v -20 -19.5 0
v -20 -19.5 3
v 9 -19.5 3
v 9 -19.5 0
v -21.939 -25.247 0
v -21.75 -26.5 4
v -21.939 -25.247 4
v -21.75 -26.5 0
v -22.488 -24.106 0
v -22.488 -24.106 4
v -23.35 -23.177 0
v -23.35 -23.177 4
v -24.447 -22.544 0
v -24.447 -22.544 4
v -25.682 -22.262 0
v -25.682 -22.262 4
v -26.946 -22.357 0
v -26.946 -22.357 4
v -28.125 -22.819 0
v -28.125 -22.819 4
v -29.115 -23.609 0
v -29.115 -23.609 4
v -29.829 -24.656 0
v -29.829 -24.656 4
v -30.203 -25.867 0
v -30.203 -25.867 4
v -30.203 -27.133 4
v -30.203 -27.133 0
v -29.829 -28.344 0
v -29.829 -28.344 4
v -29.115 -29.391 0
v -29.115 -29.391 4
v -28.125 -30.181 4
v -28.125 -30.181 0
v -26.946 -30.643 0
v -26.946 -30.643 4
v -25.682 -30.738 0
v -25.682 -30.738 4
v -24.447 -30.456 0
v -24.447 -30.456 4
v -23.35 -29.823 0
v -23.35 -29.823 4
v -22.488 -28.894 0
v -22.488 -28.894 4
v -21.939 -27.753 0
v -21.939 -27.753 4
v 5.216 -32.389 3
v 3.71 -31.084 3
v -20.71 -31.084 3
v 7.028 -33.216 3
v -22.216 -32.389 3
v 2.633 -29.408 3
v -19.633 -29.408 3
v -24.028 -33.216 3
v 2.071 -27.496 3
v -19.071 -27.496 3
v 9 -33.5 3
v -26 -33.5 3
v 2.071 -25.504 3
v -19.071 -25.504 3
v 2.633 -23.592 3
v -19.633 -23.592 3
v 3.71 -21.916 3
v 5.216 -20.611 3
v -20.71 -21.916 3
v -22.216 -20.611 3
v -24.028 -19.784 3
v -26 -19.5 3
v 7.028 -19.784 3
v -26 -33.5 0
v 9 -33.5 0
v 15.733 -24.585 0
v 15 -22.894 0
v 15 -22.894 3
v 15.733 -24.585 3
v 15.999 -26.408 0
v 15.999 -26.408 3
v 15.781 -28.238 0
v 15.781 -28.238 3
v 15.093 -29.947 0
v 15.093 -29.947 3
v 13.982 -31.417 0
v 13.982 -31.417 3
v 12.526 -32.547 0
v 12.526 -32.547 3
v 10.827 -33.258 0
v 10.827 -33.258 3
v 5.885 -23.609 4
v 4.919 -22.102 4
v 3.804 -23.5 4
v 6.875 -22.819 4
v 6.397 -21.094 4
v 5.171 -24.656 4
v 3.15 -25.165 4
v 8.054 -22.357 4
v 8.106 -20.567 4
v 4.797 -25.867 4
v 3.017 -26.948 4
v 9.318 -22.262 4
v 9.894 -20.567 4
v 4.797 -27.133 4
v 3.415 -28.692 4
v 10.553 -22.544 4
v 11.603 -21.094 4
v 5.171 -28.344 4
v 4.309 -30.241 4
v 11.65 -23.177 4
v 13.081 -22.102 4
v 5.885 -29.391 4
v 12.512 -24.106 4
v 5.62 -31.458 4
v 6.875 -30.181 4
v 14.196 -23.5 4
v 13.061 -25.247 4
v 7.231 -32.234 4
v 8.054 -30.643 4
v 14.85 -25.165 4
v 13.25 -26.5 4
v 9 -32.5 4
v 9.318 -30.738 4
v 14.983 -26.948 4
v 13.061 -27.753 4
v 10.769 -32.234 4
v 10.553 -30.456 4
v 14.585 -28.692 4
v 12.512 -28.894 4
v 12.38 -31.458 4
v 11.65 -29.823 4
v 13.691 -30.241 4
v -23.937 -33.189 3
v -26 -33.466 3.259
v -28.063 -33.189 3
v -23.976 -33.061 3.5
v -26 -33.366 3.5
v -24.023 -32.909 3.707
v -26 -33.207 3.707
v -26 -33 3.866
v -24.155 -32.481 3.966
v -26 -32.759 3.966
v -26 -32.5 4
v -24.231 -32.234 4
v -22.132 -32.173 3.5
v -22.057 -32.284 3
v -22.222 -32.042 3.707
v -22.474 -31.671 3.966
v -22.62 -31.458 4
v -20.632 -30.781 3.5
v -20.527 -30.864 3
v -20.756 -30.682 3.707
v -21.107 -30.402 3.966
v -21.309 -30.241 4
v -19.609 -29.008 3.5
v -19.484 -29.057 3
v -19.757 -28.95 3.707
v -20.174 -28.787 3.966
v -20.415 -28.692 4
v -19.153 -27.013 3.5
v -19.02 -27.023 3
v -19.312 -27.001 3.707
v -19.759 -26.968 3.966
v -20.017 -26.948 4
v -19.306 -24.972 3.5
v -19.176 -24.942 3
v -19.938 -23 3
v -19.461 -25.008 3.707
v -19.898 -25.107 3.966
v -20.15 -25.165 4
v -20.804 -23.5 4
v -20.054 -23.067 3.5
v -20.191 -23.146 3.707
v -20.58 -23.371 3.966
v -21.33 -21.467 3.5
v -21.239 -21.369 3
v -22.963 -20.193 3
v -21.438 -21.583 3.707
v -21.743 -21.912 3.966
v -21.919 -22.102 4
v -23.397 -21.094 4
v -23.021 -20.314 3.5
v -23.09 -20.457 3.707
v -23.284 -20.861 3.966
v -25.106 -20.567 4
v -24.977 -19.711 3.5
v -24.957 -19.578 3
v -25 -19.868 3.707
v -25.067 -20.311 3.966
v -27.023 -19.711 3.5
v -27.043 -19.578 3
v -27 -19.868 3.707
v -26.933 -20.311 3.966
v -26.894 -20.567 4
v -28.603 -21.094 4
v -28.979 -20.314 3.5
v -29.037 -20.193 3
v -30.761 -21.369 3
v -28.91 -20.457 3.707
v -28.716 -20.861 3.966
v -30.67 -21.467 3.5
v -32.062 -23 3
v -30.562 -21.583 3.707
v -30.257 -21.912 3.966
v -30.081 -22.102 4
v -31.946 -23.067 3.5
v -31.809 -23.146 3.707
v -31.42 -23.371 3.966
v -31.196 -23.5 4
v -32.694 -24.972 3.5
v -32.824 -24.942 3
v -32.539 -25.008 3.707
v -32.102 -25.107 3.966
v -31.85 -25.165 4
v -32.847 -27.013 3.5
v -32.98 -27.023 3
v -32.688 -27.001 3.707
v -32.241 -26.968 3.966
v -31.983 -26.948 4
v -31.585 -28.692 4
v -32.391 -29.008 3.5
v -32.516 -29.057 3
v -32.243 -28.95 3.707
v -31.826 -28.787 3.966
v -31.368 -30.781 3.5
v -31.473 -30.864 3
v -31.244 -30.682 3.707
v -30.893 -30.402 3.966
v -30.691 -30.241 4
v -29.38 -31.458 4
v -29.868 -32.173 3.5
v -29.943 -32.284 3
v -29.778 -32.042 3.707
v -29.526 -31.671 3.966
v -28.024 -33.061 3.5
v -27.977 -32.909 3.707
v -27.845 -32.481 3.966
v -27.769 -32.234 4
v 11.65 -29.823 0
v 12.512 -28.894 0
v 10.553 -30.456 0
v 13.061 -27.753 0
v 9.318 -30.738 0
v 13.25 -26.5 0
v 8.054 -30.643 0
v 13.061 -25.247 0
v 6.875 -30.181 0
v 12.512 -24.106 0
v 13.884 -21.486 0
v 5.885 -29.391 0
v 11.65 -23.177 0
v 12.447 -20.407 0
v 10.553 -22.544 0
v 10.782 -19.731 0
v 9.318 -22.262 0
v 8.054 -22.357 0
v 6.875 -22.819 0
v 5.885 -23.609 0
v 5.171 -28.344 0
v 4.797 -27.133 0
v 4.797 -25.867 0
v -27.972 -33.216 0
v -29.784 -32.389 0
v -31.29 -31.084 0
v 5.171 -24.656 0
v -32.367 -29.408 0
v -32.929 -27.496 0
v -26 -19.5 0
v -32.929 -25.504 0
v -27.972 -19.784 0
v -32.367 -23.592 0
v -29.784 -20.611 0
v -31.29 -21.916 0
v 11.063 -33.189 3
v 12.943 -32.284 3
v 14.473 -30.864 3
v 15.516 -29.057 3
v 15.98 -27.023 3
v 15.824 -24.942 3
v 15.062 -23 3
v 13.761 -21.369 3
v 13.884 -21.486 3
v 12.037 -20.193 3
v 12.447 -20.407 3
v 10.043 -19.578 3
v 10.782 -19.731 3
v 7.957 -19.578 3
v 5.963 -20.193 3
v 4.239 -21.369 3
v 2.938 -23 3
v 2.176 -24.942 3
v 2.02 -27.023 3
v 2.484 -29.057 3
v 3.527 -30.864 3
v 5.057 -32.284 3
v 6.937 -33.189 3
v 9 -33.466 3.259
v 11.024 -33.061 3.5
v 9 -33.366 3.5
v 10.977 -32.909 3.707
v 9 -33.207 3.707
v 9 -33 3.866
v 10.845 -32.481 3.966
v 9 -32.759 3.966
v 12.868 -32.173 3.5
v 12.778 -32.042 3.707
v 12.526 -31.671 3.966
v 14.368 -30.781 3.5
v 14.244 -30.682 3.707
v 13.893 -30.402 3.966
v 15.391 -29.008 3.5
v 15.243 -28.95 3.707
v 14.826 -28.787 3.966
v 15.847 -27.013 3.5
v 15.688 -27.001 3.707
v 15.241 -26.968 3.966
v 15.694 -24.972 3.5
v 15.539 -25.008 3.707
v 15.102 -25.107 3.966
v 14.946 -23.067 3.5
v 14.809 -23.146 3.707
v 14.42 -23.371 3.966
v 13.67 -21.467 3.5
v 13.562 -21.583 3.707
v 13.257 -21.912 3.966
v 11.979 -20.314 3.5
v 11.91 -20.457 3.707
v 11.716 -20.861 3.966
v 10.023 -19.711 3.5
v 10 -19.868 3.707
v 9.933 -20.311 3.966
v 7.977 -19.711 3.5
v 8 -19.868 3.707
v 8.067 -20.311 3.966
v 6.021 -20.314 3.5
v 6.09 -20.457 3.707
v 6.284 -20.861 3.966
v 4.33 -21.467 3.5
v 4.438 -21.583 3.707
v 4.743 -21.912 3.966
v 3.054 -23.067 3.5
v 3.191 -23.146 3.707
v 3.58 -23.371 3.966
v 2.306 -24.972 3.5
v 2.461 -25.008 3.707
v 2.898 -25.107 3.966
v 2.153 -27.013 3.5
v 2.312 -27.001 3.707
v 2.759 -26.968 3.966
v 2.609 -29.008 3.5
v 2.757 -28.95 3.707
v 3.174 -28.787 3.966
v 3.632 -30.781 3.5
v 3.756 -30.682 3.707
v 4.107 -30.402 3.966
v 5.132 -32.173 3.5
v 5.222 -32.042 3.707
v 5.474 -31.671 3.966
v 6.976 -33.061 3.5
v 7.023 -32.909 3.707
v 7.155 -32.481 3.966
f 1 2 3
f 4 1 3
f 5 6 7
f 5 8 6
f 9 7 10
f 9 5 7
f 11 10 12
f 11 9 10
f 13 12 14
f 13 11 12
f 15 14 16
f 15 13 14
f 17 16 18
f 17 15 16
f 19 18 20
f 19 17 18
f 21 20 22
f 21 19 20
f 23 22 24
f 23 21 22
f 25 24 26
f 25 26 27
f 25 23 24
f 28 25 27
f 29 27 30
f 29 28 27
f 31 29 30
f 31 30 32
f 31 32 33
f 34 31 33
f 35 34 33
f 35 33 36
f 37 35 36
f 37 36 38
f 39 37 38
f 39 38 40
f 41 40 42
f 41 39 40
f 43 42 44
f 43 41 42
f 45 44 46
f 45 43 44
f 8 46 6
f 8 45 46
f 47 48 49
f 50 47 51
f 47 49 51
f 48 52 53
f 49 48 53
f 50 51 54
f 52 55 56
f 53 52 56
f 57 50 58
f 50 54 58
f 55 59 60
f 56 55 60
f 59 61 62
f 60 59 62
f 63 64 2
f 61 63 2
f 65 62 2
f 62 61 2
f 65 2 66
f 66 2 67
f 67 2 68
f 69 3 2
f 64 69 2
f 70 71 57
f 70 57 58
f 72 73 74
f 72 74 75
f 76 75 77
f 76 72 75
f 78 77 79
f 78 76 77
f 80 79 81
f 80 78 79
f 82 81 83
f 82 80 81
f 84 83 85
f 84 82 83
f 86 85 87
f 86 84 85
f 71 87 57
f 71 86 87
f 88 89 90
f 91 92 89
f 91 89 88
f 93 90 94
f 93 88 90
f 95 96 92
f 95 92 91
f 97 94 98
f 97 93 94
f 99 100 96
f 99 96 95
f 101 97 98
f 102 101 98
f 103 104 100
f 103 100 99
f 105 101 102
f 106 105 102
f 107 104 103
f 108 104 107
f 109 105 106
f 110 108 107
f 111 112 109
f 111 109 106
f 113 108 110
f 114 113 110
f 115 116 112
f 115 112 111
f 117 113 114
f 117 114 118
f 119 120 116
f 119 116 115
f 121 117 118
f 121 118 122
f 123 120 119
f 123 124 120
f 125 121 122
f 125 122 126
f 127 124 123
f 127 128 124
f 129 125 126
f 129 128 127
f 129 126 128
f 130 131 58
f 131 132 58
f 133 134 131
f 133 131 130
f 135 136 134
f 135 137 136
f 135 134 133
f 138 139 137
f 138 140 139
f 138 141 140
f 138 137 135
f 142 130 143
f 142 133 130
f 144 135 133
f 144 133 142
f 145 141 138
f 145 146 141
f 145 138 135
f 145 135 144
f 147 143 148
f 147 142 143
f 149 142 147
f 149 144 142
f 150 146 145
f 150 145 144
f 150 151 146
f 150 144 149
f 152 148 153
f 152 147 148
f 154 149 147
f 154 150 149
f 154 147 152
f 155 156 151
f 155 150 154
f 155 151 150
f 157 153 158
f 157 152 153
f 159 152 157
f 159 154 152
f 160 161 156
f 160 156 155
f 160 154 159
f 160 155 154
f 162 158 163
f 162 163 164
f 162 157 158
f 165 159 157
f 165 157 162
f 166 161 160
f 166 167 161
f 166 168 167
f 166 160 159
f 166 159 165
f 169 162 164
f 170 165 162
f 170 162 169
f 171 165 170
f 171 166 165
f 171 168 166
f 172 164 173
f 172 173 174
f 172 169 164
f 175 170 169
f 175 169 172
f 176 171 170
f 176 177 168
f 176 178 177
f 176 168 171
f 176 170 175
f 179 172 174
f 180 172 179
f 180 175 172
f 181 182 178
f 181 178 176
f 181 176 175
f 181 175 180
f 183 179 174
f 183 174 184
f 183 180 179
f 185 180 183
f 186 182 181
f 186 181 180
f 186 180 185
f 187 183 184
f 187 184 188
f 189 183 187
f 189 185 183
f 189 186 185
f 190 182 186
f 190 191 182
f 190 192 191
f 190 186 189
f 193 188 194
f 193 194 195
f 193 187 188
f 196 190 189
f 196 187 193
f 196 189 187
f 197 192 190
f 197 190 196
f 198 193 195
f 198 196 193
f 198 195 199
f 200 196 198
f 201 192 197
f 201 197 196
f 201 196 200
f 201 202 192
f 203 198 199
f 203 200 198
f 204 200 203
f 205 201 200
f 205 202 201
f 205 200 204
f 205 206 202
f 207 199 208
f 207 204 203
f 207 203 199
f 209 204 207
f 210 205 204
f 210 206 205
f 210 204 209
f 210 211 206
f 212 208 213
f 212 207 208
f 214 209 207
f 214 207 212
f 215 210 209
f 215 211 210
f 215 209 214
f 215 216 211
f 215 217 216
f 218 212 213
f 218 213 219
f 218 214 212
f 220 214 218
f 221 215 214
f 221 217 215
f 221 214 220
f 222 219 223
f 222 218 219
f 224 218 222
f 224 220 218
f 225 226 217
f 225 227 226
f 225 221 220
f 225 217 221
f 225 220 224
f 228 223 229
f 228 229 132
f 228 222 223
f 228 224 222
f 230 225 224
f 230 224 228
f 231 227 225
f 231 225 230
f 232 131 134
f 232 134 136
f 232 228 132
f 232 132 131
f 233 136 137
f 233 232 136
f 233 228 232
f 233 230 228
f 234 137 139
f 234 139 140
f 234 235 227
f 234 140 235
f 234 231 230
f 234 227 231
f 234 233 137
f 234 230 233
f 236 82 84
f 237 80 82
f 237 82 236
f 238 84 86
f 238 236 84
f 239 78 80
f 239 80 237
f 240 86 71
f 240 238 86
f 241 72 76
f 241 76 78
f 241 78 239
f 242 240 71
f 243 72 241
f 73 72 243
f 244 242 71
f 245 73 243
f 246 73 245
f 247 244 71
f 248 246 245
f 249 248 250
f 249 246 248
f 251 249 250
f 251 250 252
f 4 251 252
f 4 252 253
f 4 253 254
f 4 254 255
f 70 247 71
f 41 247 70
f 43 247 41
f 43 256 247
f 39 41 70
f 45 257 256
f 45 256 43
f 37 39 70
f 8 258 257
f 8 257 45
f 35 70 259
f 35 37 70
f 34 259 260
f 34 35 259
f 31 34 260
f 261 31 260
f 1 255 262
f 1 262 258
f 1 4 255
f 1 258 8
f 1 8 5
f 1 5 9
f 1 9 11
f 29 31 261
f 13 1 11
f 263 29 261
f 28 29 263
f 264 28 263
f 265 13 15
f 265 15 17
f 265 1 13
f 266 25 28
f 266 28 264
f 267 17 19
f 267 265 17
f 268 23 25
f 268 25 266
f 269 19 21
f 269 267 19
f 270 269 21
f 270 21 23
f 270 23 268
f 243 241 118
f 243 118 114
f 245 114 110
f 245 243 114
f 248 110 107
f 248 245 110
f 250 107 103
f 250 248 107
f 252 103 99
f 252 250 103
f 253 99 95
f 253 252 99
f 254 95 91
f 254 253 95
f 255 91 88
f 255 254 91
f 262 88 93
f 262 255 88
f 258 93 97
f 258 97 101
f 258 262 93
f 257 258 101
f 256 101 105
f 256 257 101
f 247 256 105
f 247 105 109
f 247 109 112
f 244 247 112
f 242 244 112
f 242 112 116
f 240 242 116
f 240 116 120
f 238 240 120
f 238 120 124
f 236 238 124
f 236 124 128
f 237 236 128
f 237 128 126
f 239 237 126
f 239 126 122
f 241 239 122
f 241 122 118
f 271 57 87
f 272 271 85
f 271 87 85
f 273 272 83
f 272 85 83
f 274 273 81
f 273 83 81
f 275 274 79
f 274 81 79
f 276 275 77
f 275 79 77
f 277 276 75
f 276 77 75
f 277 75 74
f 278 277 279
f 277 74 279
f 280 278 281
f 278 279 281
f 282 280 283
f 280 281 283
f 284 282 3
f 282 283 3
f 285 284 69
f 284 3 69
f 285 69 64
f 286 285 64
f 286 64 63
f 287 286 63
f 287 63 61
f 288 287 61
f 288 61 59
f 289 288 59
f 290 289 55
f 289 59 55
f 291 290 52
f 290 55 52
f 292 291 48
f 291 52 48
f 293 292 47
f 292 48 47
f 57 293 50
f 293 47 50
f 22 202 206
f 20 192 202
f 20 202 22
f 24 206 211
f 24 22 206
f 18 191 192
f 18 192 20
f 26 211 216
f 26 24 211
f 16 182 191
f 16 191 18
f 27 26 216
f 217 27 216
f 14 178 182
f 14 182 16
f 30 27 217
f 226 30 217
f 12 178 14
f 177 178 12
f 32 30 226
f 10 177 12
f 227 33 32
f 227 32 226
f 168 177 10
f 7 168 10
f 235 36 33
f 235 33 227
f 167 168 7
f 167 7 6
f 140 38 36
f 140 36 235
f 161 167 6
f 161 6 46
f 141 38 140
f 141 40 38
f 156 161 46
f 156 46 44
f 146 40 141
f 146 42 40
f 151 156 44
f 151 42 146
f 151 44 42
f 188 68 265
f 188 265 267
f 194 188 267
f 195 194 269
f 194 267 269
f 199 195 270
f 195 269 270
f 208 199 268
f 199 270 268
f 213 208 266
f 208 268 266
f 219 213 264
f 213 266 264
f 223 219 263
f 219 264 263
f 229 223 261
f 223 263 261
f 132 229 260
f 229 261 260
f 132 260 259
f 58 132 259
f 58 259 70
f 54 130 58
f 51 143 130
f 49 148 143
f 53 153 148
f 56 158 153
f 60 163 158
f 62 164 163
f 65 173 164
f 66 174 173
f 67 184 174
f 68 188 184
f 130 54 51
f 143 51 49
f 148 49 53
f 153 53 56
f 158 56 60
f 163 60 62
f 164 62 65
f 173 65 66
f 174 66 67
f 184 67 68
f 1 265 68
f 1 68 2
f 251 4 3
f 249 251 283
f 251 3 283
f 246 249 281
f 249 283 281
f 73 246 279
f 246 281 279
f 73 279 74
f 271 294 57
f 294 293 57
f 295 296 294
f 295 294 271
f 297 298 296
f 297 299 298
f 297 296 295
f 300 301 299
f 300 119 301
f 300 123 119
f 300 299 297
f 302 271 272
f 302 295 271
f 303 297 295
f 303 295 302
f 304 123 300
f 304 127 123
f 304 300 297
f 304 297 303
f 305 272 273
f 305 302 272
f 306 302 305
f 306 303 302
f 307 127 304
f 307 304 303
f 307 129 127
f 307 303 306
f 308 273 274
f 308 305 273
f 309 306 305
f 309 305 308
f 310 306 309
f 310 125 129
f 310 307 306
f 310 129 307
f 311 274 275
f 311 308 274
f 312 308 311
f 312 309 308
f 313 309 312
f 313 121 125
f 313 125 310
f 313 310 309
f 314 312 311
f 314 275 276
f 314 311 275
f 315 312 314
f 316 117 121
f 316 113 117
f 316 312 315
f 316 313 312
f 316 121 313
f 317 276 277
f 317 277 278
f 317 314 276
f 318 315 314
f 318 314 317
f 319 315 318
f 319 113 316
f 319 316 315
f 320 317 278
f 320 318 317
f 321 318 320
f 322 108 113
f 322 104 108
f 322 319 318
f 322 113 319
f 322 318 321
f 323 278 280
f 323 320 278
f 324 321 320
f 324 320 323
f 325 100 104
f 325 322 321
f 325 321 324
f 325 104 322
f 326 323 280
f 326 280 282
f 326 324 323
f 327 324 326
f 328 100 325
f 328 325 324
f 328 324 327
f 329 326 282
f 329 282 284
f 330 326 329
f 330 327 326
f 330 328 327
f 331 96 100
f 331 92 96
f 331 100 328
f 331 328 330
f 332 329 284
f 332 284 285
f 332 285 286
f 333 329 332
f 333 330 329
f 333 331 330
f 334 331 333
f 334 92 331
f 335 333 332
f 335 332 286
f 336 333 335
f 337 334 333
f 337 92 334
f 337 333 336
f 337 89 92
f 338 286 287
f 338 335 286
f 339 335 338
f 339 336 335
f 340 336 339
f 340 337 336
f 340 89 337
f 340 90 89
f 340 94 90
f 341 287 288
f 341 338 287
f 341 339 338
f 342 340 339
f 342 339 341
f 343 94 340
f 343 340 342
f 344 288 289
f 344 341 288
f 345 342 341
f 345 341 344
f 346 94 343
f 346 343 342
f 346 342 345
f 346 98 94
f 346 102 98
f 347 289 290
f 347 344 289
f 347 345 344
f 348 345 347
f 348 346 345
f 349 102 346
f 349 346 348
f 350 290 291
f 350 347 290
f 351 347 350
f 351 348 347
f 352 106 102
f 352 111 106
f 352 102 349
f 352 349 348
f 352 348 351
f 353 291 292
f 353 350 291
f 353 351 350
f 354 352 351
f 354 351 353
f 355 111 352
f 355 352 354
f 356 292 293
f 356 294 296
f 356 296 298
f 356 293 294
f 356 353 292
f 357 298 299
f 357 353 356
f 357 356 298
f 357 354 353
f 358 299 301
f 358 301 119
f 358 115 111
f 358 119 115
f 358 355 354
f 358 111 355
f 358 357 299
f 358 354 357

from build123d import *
from build123d.topology import SkipClean

# Parameters (mm, degrees)
SKETCH1_R           = 4.25
SKETCH1_W           = 20
SKETCH1_H           = 5
BOSS_EXTRUDE1_DEPTH = 3
SKETCH2_R           = 7
SKETCH2_R_2         = 4.25
BOSS_EXTRUDE2_DEPTH = 1
FILLET1_R           = 1
CUT_EXTRUDE1_DEPTH  = 48.11952886


with BuildPart() as part:
    # Sketch1 → Boss-Extrude1 (new body)
    with BuildSketch(Plane.XY):
        with BuildLine():
            Line((9, -33.5), (-26, -33.5))
            ThreePointArc((-26, -33.5), (-33, -26.5), (-26, -19.5))
            Line((-26, -19.5), (-20, -19.5))
            ThreePointArc((-20, -19.5), (-16.464466094, -18.035533906), (-15, -14.5))
            Line((-15, -14.5), (-15, 28.5))
            ThreePointArc((-15, 28.5), (-13.535533906, 32.035533906), (-10, 33.5))
            Line((-10, 33.5), (10, 33.5))
            ThreePointArc((10, 33.5), (13.535533906, 32.035533906), (15, 28.5))
            Line((15, 28.5), (15, -22.894448725))
            ThreePointArc((15, -22.894448725), (15.092571663, -29.946820352), (9, -33.5))
        make_face()
        with Locations((9, -26.5)):
            Circle(SKETCH1_R, mode=Mode.SUBTRACT)
        with Locations((-26, -26.5)):
            Circle(SKETCH1_R, mode=Mode.SUBTRACT)
        with Locations((0, 26)):
            Rectangle(SKETCH1_W, SKETCH1_H, mode=Mode.SUBTRACT)
    extrude(amount=BOSS_EXTRUDE1_DEPTH)

    # Sketch2 → Boss-Extrude2 (add)
    # profile 1 of 2: a face of its own
    with BuildSketch(Plane.XY.offset(3)):
        with Locations(Location((-26, -26.5, 0), (0, 0, 270))):
            Circle(SKETCH2_R)
        with Locations((-26, -26.5)):
            Circle(SKETCH2_R_2, mode=Mode.SUBTRACT)
    # profile 2 of 2: a face of its own
    with BuildSketch(Plane.XY.offset(3)):
        with Locations(Location((9, -26.5, 0), (0, 0, 270))):
            Circle(SKETCH2_R)
        with Locations((9, -26.5)):
            Circle(SKETCH2_R_2, mode=Mode.SUBTRACT)
    extrude(amount=BOSS_EXTRUDE2_DEPTH)

    # Fillet1
    fillet1_edges = [part.edges().sort_by_distance(p)[0] for p in [
        (-26, -19.5, 4),
        (9, -19.5, 4),
    ]]
    fillet(fillet1_edges, radius=FILLET1_R - 0.0001)  # a hair under: the kernel refuses the full size

    # Sketch3 → Cut-Extrude1 (cut, through all)
    with SkipClean():  # the faces are left unmerged after this step: merging them gives an invalid solid
        with BuildSketch(Plane.XY.offset(3)):
            with BuildLine():
                Line((-20, -19.5), (9, -19.5))
                ThreePointArc((9, -19.5), (12.446820352, -20.407428337), (15, -22.894448725))
                Line((15, -22.894448725), (15, 33.5))
                Line((15, 33.5), (-20, 33.5))
                Line((-20, 33.5), (-20, -19.5))
            make_face()
        extrude(amount=-CUT_EXTRUDE1_DEPTH, mode=Mode.SUBTRACT)


solid = part.part
